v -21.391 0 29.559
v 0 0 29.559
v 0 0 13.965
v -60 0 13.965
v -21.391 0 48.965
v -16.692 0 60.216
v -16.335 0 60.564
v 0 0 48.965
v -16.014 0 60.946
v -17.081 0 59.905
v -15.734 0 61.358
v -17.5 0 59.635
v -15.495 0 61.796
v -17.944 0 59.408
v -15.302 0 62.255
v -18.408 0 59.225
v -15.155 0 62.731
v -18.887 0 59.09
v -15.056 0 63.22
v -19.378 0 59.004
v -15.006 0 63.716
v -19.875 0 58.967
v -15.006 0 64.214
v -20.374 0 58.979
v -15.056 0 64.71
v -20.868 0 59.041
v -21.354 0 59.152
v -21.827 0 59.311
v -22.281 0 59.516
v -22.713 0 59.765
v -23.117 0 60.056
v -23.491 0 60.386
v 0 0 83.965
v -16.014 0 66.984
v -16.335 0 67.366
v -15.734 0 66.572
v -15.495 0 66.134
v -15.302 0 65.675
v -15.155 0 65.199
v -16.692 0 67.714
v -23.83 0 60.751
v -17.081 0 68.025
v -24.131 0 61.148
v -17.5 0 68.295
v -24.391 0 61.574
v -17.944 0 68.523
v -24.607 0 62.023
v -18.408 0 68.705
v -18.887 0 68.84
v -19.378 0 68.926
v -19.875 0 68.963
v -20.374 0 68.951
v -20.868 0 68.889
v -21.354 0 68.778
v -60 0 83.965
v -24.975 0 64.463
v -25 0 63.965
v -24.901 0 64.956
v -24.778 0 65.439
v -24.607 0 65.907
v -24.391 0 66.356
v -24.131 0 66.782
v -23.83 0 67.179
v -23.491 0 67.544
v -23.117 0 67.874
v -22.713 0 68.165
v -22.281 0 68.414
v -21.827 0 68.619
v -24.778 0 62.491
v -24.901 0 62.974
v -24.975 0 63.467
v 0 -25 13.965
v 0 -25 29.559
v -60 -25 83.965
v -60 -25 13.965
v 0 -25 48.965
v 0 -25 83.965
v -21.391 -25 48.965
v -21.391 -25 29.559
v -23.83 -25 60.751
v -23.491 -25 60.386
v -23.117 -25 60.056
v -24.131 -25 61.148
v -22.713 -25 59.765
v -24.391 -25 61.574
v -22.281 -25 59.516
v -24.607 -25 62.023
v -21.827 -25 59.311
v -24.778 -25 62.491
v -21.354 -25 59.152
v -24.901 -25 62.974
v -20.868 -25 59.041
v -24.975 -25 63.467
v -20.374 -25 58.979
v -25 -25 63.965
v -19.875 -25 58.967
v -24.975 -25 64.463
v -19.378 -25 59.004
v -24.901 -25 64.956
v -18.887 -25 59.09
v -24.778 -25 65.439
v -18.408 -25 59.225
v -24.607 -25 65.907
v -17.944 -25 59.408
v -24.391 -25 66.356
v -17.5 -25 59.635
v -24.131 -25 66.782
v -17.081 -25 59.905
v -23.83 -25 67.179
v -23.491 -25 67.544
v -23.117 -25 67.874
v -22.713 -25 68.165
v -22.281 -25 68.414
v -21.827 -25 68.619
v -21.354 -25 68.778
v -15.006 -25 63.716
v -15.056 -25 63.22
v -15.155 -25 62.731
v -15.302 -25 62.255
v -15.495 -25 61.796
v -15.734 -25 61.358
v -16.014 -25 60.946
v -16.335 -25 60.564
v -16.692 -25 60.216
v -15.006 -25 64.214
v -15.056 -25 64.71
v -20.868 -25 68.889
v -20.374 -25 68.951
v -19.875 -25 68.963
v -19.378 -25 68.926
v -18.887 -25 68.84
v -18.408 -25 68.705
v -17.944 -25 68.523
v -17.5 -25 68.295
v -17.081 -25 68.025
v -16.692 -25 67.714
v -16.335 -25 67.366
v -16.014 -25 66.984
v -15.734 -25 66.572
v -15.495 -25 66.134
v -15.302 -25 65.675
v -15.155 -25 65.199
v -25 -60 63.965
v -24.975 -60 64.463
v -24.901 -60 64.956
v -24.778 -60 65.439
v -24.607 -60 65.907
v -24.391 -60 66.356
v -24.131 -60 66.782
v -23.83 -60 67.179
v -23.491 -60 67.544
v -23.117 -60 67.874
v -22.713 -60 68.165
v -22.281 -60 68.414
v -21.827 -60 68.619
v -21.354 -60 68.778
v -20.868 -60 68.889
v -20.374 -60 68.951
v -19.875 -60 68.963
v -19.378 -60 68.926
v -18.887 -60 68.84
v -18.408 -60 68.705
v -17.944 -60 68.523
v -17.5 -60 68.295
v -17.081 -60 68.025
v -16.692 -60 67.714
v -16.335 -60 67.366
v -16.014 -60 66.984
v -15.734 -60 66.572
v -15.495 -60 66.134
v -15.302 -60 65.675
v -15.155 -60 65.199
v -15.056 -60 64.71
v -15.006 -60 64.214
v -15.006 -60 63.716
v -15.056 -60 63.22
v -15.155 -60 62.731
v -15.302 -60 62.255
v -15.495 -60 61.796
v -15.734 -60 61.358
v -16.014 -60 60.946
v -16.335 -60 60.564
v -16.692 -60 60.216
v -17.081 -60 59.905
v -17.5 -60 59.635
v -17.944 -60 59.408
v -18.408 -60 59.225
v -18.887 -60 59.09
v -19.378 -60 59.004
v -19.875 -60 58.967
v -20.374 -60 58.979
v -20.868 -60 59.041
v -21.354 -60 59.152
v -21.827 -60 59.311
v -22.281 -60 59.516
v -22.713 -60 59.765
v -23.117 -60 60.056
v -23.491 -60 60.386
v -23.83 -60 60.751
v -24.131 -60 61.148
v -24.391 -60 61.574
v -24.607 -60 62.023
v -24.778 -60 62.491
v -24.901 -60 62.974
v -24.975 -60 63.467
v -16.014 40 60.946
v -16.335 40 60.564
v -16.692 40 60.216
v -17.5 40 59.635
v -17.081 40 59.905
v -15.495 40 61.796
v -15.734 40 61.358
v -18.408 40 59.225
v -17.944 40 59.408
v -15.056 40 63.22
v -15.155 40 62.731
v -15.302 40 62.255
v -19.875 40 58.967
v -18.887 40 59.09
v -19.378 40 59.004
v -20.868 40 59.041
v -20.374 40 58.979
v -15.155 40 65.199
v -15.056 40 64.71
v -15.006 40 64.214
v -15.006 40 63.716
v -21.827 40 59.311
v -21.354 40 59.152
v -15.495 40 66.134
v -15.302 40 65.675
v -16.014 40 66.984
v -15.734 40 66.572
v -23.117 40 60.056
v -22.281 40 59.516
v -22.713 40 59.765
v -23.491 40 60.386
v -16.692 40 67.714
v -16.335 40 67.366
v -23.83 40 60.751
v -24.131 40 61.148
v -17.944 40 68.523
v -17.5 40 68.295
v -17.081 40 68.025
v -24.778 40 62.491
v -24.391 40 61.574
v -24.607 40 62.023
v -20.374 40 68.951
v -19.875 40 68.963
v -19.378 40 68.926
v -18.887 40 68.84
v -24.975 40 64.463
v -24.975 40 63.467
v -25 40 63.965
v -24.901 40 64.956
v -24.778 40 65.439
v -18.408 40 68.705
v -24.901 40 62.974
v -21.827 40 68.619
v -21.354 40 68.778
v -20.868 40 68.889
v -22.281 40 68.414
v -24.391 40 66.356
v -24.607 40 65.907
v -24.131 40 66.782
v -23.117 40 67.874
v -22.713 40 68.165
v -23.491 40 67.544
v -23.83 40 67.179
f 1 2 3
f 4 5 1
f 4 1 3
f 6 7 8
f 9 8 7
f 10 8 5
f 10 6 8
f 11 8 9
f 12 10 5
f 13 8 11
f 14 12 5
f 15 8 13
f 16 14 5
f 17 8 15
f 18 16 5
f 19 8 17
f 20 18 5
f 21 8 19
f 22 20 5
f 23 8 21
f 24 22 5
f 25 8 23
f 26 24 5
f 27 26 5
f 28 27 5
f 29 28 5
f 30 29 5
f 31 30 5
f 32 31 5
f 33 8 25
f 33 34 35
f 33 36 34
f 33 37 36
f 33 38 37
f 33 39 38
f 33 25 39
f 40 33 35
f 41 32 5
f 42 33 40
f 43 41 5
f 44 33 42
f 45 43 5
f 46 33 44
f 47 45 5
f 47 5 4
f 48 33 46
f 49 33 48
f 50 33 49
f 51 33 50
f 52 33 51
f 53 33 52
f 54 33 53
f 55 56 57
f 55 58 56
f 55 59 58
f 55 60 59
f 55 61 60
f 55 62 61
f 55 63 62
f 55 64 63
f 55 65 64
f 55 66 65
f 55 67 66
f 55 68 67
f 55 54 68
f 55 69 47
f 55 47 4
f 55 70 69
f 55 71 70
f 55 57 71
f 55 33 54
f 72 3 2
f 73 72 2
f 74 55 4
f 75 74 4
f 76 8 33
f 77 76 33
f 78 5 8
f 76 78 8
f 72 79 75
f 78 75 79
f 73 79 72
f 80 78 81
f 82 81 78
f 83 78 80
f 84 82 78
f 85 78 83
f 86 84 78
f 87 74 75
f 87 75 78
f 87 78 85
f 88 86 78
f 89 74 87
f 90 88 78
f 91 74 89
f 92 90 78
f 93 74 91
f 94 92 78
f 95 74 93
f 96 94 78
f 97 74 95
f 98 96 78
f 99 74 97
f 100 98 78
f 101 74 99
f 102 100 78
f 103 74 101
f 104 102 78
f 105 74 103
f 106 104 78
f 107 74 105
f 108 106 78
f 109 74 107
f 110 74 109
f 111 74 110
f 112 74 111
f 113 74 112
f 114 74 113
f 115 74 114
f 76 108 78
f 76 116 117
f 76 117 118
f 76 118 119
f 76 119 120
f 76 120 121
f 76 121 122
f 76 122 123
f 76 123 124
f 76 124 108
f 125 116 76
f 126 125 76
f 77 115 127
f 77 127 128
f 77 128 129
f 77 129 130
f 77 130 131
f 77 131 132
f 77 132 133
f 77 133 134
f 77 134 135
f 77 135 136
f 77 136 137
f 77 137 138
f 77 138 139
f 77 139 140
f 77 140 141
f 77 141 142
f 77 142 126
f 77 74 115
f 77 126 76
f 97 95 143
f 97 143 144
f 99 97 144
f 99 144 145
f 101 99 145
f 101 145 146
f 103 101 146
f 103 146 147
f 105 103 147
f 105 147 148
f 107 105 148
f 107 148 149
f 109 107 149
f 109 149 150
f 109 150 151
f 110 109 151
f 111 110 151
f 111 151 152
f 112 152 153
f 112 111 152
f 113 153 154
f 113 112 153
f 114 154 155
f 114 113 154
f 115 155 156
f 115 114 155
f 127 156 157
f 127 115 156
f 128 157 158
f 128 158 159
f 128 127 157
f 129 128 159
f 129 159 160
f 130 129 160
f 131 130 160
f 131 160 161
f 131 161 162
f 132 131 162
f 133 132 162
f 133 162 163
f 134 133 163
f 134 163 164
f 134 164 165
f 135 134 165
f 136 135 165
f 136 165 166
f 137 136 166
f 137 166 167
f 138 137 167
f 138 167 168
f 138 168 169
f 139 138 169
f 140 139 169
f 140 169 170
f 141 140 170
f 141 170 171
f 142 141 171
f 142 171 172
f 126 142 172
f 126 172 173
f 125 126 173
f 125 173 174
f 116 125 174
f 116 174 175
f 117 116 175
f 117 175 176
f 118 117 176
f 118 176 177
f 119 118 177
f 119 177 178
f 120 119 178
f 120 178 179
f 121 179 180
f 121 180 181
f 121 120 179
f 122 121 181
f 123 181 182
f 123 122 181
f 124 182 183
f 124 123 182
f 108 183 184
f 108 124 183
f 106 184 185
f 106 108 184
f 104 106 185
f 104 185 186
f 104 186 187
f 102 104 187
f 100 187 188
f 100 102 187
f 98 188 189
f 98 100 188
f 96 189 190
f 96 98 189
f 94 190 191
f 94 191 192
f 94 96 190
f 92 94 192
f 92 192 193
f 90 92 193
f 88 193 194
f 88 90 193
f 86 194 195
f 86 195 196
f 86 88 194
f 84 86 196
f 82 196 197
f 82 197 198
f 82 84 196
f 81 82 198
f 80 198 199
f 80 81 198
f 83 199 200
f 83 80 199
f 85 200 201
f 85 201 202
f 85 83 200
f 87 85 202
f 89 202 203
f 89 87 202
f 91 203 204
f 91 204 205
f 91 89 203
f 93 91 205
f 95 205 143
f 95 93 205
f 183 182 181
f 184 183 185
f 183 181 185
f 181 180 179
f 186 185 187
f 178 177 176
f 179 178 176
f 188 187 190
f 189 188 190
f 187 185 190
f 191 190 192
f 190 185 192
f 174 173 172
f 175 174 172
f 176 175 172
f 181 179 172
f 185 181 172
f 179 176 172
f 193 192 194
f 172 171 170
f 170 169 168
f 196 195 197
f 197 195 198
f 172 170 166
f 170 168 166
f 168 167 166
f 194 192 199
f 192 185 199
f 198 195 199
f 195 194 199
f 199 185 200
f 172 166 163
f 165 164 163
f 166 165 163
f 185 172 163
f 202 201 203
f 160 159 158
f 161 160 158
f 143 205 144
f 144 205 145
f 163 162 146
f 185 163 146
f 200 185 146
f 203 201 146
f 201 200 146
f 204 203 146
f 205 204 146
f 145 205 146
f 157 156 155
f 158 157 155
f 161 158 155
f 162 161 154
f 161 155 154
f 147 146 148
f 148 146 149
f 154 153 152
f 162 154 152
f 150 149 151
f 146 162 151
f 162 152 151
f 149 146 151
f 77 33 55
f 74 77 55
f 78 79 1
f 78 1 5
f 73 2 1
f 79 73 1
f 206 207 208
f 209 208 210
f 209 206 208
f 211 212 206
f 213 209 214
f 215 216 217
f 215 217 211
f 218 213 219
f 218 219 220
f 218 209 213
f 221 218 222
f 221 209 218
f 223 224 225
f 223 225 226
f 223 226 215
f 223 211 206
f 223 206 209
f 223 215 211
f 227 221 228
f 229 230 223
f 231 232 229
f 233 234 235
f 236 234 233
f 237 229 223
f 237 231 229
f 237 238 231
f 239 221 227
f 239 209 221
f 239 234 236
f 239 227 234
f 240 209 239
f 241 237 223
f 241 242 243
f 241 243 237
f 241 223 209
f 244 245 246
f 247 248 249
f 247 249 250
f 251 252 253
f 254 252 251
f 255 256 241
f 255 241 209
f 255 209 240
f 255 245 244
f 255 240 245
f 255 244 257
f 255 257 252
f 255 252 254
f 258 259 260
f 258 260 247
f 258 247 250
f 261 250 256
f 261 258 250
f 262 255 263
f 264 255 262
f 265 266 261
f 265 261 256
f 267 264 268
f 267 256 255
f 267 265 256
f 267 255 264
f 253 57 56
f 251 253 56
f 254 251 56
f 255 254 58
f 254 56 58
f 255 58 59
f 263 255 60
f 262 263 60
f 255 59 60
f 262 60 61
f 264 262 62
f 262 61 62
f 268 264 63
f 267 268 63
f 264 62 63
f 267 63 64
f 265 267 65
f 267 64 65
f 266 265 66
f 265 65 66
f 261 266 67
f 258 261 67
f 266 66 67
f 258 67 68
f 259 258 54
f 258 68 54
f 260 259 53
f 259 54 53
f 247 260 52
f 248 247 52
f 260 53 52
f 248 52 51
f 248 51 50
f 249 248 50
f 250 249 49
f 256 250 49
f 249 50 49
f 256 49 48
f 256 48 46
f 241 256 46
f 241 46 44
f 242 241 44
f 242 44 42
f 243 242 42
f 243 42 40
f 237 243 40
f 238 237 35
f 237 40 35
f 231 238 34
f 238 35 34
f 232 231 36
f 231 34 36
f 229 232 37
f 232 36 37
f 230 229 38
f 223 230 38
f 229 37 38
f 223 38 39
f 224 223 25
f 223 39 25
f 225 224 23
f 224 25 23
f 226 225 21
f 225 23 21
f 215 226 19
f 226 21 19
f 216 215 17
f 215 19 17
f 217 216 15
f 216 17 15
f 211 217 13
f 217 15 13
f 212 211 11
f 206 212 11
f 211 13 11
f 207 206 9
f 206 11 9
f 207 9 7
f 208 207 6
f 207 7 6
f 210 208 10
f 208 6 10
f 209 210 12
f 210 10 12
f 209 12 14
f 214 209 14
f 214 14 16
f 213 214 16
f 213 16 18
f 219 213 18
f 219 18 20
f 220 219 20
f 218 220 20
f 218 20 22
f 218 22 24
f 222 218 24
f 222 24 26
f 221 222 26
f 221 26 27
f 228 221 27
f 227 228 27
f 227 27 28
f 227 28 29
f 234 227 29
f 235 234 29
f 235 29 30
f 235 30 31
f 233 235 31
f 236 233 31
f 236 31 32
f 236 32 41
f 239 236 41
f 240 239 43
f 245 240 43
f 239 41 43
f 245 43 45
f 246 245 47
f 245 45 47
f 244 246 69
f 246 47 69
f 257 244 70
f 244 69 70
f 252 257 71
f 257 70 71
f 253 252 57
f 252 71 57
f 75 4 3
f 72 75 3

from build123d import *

# Parameters (mm, degrees)
F1_DEPTH      = 25
F2_R          = 5
F3_DEPTH      = 60
F3_DEPTH_BACK = 40


with BuildPart() as f1:
    # F0 (on Front) → F1 (new body)
    with BuildSketch(Plane.XZ):
        Polygon((0, 83.9650441706), (-60, 83.9650441706), (-60, 13.9650441706), (0, 13.9650441706), (0, 29.5586726815), (-21.3913675398, 29.5586726815), (-21.3913675398, 48.9650441706), (0, 48.9650441706), align=None)
    extrude(amount=F1_DEPTH)

    # F2 (on face) → F3 (join, two sides)
    with BuildSketch(Plane(origin=(0, 0, 0), x_dir=(-1, 0, 0), z_dir=(0, 1, 0))) as f3_sk:
        with Locations((20, 63.9650441706)):
            Circle(F2_R)
    extrude(amount=-F3_DEPTH)
    extrude(f3_sk.sketch, amount=F3_DEPTH_BACK)


solid = f1.part
